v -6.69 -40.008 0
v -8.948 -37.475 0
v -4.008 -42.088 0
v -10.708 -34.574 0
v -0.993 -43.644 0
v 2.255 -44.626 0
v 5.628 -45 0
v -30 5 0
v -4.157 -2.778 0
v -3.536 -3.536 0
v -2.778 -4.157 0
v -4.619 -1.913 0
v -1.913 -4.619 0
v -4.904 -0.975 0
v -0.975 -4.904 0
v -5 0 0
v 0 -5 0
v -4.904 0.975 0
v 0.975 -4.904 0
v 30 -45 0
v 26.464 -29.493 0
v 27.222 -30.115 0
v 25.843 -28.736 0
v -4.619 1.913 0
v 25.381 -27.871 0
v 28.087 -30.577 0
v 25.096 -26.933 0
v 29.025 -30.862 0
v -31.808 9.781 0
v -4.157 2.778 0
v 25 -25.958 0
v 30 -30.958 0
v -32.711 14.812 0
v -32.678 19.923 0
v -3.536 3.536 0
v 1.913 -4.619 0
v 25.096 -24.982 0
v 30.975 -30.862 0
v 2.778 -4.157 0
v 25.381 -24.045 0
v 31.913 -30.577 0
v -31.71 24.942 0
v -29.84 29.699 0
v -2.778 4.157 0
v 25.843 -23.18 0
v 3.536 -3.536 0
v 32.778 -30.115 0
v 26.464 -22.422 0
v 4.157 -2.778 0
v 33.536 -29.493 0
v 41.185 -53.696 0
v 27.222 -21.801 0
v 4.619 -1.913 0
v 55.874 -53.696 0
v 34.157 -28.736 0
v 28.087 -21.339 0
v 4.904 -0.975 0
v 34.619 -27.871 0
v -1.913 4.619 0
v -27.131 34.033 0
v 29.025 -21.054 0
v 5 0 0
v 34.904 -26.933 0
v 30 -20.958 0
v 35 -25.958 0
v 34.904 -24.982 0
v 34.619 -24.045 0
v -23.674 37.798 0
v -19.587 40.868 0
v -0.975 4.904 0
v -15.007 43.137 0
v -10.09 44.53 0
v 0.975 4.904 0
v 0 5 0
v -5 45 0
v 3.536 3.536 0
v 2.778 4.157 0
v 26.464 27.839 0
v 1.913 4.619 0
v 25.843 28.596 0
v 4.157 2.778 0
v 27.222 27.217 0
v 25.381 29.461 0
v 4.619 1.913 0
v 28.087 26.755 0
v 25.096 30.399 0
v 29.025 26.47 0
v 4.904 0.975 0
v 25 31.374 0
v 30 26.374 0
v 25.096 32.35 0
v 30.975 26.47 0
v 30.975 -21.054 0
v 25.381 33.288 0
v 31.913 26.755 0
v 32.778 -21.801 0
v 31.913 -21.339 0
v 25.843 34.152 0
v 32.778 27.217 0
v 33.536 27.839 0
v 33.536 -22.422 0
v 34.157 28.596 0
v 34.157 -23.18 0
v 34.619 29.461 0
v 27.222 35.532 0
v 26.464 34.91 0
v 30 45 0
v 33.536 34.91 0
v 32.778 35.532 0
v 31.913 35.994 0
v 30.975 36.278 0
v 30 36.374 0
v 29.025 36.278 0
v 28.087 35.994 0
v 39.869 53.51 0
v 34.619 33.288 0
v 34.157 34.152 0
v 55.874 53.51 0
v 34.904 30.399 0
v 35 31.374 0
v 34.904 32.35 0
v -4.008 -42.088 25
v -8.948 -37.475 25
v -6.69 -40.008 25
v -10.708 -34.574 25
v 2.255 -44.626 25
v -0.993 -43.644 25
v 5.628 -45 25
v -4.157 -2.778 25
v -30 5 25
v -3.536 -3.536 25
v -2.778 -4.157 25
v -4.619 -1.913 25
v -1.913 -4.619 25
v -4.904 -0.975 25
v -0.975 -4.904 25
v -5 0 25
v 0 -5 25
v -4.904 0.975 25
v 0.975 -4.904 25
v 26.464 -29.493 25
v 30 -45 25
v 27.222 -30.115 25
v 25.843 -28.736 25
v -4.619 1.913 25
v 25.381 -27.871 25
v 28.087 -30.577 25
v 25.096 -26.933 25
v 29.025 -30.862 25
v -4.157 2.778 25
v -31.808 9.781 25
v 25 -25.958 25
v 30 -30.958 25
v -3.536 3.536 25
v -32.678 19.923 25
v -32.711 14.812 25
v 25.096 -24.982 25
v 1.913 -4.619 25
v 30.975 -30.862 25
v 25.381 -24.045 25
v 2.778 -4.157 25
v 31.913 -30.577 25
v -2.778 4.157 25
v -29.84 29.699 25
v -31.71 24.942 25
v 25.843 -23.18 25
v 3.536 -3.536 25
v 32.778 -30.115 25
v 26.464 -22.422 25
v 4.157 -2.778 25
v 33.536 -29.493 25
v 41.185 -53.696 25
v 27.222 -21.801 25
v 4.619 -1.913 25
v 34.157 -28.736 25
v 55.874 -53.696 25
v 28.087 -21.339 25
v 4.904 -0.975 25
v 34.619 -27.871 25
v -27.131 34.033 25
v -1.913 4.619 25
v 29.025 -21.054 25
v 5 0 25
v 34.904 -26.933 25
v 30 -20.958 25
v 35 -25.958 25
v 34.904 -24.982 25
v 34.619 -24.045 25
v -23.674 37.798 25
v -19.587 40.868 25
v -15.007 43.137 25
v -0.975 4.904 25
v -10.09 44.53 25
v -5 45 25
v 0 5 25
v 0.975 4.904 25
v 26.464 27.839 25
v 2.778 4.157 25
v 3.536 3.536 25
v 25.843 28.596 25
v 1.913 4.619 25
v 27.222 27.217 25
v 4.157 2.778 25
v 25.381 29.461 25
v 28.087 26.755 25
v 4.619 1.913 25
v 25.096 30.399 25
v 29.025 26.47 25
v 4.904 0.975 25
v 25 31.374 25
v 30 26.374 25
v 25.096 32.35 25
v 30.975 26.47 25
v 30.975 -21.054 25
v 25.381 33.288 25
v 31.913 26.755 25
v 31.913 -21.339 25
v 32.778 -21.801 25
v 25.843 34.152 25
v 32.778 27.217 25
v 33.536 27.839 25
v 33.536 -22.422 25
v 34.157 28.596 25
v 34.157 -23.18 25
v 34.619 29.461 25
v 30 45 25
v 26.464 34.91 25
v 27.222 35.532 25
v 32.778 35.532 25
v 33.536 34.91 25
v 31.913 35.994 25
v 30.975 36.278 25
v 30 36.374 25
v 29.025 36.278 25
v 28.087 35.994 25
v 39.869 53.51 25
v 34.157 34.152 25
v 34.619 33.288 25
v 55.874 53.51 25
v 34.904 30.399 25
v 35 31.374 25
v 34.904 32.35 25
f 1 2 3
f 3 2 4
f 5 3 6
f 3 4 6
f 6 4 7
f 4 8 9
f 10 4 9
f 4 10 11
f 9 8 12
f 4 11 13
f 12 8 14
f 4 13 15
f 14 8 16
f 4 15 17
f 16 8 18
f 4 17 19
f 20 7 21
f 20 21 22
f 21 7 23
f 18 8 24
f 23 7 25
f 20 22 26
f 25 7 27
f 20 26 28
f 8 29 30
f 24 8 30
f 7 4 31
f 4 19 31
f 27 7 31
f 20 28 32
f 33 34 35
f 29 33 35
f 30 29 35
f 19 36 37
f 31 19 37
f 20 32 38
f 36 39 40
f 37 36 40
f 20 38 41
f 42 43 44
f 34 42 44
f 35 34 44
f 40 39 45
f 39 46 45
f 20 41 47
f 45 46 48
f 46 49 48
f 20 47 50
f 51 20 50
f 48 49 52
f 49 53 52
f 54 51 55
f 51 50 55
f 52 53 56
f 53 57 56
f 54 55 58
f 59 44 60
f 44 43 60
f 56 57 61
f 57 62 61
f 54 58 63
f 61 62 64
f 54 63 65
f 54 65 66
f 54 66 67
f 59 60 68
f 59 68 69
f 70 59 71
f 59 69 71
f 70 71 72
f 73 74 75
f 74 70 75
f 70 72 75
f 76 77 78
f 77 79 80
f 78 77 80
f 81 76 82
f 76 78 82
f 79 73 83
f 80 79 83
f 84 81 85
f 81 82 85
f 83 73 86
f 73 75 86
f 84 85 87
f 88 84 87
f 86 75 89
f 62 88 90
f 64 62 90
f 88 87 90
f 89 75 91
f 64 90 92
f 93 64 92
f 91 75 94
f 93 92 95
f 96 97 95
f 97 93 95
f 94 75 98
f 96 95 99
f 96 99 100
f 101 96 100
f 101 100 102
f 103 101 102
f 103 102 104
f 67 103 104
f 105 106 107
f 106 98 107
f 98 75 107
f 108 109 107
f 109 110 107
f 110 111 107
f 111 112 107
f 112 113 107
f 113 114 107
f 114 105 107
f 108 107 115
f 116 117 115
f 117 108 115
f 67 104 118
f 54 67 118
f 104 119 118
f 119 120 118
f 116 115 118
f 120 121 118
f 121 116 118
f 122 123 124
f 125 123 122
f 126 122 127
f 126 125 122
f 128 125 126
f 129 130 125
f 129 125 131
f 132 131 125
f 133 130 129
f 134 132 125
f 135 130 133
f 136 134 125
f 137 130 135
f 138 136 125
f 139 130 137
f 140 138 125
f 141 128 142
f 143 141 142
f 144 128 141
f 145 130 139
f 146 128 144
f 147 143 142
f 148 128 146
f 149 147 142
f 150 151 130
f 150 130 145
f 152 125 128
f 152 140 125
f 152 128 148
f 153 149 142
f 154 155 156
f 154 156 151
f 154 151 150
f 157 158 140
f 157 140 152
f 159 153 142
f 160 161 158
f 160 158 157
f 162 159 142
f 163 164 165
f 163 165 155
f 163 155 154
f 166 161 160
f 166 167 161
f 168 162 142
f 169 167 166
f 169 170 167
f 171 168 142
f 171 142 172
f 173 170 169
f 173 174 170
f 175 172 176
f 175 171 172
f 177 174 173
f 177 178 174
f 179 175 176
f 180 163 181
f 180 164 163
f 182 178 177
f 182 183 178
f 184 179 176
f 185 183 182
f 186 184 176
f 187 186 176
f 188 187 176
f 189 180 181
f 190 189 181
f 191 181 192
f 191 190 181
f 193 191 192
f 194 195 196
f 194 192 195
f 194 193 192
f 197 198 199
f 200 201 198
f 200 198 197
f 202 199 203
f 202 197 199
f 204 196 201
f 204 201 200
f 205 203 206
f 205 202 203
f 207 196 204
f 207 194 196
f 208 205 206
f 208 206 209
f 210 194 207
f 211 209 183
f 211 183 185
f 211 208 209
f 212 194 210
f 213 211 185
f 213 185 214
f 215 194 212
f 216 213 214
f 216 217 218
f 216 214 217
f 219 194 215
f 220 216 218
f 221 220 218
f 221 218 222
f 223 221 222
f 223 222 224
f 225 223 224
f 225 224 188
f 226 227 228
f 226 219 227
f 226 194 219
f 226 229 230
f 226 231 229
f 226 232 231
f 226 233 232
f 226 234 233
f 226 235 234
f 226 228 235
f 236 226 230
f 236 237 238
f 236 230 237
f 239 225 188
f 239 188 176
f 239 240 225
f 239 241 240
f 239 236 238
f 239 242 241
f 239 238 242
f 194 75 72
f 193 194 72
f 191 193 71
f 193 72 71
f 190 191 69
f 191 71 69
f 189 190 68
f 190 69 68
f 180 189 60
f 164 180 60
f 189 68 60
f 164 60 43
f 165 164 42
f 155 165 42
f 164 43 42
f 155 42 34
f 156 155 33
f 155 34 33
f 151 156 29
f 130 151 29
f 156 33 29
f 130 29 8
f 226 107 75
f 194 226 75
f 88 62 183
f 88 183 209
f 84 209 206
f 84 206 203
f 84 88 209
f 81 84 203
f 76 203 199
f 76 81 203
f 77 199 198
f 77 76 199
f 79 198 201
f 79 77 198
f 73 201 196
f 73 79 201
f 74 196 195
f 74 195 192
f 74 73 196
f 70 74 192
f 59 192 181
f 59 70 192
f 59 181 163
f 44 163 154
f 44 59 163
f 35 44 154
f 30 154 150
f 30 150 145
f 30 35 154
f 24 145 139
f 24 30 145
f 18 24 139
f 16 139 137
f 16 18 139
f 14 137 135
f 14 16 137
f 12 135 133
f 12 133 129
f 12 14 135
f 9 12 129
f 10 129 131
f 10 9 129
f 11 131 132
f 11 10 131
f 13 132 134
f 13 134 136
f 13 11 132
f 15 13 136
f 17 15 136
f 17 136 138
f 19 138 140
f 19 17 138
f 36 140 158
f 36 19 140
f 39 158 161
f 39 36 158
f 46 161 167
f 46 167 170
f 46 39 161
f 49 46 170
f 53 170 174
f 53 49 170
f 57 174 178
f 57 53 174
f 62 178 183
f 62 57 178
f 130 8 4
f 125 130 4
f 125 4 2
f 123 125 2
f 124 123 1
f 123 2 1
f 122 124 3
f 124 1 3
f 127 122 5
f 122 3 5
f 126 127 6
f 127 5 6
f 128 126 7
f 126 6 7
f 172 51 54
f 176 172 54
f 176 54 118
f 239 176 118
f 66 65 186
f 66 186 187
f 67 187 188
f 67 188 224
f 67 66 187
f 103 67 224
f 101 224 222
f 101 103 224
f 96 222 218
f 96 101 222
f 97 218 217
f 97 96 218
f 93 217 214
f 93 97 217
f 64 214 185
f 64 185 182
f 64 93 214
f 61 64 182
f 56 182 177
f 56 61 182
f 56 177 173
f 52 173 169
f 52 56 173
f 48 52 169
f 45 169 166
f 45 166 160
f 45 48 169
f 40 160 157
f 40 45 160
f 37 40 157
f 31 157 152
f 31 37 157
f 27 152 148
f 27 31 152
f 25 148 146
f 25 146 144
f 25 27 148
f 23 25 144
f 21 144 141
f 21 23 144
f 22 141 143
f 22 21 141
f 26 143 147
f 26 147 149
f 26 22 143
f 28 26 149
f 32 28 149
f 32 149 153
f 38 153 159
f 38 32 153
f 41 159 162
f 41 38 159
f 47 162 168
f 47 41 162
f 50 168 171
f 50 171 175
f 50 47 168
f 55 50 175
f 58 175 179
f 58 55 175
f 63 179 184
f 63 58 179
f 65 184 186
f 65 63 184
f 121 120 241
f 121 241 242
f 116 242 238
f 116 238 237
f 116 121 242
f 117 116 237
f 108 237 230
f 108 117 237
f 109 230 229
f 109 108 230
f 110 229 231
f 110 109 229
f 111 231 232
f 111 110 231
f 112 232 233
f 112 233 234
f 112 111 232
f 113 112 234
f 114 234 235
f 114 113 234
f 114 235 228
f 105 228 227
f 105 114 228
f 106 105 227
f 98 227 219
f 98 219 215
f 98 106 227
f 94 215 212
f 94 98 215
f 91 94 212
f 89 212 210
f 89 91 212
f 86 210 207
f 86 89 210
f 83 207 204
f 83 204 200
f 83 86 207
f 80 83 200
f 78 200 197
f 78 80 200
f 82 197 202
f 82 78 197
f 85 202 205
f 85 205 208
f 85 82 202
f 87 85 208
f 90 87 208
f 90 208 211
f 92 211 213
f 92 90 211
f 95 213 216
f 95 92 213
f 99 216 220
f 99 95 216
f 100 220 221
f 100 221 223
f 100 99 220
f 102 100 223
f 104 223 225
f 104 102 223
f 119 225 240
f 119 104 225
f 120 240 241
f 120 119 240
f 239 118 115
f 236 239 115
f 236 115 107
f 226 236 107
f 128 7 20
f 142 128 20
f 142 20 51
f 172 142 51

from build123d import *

# Parameters (mm, degrees)
F0_R     = 5
F1_DEPTH = 25


with BuildPart() as f1:
    # F0 (on Top) → F1 (new body)
    with BuildSketch(Plane.XY):
        with BuildLine():
            Line((39.869443, 53.510454), (30, 45))
            Line((30, 45), (-5, 45))
            ThreePointArc((-5, 45), (-28.584953, 31.928096), (-30, 5))
            Line((-30, 5), (-10.707767, -34.573811))
            ThreePointArc((-10.707767, -34.573811), (-4.008451, -42.087552), (5.627668, -45))
            Line((5.627668, -45), (30, -45))
            Line((30, -45), (41.184861, -53.695992))
            Line((41.184861, -53.695992), (55.873677, -53.695992))
            Line((55.873677, -53.695992), (55.873677, 53.510454))
            Line((55.873677, 53.510454), (39.869443, 53.510454))
        make_face()
        with Locations((30, -25.957934)):
            Circle(F0_R, mode=Mode.SUBTRACT)
        Circle(F0_R, mode=Mode.SUBTRACT)
        with Locations((30, 31.374168)):
            Circle(F0_R, mode=Mode.SUBTRACT)
    extrude(amount=F1_DEPTH)


solid = f1.part
